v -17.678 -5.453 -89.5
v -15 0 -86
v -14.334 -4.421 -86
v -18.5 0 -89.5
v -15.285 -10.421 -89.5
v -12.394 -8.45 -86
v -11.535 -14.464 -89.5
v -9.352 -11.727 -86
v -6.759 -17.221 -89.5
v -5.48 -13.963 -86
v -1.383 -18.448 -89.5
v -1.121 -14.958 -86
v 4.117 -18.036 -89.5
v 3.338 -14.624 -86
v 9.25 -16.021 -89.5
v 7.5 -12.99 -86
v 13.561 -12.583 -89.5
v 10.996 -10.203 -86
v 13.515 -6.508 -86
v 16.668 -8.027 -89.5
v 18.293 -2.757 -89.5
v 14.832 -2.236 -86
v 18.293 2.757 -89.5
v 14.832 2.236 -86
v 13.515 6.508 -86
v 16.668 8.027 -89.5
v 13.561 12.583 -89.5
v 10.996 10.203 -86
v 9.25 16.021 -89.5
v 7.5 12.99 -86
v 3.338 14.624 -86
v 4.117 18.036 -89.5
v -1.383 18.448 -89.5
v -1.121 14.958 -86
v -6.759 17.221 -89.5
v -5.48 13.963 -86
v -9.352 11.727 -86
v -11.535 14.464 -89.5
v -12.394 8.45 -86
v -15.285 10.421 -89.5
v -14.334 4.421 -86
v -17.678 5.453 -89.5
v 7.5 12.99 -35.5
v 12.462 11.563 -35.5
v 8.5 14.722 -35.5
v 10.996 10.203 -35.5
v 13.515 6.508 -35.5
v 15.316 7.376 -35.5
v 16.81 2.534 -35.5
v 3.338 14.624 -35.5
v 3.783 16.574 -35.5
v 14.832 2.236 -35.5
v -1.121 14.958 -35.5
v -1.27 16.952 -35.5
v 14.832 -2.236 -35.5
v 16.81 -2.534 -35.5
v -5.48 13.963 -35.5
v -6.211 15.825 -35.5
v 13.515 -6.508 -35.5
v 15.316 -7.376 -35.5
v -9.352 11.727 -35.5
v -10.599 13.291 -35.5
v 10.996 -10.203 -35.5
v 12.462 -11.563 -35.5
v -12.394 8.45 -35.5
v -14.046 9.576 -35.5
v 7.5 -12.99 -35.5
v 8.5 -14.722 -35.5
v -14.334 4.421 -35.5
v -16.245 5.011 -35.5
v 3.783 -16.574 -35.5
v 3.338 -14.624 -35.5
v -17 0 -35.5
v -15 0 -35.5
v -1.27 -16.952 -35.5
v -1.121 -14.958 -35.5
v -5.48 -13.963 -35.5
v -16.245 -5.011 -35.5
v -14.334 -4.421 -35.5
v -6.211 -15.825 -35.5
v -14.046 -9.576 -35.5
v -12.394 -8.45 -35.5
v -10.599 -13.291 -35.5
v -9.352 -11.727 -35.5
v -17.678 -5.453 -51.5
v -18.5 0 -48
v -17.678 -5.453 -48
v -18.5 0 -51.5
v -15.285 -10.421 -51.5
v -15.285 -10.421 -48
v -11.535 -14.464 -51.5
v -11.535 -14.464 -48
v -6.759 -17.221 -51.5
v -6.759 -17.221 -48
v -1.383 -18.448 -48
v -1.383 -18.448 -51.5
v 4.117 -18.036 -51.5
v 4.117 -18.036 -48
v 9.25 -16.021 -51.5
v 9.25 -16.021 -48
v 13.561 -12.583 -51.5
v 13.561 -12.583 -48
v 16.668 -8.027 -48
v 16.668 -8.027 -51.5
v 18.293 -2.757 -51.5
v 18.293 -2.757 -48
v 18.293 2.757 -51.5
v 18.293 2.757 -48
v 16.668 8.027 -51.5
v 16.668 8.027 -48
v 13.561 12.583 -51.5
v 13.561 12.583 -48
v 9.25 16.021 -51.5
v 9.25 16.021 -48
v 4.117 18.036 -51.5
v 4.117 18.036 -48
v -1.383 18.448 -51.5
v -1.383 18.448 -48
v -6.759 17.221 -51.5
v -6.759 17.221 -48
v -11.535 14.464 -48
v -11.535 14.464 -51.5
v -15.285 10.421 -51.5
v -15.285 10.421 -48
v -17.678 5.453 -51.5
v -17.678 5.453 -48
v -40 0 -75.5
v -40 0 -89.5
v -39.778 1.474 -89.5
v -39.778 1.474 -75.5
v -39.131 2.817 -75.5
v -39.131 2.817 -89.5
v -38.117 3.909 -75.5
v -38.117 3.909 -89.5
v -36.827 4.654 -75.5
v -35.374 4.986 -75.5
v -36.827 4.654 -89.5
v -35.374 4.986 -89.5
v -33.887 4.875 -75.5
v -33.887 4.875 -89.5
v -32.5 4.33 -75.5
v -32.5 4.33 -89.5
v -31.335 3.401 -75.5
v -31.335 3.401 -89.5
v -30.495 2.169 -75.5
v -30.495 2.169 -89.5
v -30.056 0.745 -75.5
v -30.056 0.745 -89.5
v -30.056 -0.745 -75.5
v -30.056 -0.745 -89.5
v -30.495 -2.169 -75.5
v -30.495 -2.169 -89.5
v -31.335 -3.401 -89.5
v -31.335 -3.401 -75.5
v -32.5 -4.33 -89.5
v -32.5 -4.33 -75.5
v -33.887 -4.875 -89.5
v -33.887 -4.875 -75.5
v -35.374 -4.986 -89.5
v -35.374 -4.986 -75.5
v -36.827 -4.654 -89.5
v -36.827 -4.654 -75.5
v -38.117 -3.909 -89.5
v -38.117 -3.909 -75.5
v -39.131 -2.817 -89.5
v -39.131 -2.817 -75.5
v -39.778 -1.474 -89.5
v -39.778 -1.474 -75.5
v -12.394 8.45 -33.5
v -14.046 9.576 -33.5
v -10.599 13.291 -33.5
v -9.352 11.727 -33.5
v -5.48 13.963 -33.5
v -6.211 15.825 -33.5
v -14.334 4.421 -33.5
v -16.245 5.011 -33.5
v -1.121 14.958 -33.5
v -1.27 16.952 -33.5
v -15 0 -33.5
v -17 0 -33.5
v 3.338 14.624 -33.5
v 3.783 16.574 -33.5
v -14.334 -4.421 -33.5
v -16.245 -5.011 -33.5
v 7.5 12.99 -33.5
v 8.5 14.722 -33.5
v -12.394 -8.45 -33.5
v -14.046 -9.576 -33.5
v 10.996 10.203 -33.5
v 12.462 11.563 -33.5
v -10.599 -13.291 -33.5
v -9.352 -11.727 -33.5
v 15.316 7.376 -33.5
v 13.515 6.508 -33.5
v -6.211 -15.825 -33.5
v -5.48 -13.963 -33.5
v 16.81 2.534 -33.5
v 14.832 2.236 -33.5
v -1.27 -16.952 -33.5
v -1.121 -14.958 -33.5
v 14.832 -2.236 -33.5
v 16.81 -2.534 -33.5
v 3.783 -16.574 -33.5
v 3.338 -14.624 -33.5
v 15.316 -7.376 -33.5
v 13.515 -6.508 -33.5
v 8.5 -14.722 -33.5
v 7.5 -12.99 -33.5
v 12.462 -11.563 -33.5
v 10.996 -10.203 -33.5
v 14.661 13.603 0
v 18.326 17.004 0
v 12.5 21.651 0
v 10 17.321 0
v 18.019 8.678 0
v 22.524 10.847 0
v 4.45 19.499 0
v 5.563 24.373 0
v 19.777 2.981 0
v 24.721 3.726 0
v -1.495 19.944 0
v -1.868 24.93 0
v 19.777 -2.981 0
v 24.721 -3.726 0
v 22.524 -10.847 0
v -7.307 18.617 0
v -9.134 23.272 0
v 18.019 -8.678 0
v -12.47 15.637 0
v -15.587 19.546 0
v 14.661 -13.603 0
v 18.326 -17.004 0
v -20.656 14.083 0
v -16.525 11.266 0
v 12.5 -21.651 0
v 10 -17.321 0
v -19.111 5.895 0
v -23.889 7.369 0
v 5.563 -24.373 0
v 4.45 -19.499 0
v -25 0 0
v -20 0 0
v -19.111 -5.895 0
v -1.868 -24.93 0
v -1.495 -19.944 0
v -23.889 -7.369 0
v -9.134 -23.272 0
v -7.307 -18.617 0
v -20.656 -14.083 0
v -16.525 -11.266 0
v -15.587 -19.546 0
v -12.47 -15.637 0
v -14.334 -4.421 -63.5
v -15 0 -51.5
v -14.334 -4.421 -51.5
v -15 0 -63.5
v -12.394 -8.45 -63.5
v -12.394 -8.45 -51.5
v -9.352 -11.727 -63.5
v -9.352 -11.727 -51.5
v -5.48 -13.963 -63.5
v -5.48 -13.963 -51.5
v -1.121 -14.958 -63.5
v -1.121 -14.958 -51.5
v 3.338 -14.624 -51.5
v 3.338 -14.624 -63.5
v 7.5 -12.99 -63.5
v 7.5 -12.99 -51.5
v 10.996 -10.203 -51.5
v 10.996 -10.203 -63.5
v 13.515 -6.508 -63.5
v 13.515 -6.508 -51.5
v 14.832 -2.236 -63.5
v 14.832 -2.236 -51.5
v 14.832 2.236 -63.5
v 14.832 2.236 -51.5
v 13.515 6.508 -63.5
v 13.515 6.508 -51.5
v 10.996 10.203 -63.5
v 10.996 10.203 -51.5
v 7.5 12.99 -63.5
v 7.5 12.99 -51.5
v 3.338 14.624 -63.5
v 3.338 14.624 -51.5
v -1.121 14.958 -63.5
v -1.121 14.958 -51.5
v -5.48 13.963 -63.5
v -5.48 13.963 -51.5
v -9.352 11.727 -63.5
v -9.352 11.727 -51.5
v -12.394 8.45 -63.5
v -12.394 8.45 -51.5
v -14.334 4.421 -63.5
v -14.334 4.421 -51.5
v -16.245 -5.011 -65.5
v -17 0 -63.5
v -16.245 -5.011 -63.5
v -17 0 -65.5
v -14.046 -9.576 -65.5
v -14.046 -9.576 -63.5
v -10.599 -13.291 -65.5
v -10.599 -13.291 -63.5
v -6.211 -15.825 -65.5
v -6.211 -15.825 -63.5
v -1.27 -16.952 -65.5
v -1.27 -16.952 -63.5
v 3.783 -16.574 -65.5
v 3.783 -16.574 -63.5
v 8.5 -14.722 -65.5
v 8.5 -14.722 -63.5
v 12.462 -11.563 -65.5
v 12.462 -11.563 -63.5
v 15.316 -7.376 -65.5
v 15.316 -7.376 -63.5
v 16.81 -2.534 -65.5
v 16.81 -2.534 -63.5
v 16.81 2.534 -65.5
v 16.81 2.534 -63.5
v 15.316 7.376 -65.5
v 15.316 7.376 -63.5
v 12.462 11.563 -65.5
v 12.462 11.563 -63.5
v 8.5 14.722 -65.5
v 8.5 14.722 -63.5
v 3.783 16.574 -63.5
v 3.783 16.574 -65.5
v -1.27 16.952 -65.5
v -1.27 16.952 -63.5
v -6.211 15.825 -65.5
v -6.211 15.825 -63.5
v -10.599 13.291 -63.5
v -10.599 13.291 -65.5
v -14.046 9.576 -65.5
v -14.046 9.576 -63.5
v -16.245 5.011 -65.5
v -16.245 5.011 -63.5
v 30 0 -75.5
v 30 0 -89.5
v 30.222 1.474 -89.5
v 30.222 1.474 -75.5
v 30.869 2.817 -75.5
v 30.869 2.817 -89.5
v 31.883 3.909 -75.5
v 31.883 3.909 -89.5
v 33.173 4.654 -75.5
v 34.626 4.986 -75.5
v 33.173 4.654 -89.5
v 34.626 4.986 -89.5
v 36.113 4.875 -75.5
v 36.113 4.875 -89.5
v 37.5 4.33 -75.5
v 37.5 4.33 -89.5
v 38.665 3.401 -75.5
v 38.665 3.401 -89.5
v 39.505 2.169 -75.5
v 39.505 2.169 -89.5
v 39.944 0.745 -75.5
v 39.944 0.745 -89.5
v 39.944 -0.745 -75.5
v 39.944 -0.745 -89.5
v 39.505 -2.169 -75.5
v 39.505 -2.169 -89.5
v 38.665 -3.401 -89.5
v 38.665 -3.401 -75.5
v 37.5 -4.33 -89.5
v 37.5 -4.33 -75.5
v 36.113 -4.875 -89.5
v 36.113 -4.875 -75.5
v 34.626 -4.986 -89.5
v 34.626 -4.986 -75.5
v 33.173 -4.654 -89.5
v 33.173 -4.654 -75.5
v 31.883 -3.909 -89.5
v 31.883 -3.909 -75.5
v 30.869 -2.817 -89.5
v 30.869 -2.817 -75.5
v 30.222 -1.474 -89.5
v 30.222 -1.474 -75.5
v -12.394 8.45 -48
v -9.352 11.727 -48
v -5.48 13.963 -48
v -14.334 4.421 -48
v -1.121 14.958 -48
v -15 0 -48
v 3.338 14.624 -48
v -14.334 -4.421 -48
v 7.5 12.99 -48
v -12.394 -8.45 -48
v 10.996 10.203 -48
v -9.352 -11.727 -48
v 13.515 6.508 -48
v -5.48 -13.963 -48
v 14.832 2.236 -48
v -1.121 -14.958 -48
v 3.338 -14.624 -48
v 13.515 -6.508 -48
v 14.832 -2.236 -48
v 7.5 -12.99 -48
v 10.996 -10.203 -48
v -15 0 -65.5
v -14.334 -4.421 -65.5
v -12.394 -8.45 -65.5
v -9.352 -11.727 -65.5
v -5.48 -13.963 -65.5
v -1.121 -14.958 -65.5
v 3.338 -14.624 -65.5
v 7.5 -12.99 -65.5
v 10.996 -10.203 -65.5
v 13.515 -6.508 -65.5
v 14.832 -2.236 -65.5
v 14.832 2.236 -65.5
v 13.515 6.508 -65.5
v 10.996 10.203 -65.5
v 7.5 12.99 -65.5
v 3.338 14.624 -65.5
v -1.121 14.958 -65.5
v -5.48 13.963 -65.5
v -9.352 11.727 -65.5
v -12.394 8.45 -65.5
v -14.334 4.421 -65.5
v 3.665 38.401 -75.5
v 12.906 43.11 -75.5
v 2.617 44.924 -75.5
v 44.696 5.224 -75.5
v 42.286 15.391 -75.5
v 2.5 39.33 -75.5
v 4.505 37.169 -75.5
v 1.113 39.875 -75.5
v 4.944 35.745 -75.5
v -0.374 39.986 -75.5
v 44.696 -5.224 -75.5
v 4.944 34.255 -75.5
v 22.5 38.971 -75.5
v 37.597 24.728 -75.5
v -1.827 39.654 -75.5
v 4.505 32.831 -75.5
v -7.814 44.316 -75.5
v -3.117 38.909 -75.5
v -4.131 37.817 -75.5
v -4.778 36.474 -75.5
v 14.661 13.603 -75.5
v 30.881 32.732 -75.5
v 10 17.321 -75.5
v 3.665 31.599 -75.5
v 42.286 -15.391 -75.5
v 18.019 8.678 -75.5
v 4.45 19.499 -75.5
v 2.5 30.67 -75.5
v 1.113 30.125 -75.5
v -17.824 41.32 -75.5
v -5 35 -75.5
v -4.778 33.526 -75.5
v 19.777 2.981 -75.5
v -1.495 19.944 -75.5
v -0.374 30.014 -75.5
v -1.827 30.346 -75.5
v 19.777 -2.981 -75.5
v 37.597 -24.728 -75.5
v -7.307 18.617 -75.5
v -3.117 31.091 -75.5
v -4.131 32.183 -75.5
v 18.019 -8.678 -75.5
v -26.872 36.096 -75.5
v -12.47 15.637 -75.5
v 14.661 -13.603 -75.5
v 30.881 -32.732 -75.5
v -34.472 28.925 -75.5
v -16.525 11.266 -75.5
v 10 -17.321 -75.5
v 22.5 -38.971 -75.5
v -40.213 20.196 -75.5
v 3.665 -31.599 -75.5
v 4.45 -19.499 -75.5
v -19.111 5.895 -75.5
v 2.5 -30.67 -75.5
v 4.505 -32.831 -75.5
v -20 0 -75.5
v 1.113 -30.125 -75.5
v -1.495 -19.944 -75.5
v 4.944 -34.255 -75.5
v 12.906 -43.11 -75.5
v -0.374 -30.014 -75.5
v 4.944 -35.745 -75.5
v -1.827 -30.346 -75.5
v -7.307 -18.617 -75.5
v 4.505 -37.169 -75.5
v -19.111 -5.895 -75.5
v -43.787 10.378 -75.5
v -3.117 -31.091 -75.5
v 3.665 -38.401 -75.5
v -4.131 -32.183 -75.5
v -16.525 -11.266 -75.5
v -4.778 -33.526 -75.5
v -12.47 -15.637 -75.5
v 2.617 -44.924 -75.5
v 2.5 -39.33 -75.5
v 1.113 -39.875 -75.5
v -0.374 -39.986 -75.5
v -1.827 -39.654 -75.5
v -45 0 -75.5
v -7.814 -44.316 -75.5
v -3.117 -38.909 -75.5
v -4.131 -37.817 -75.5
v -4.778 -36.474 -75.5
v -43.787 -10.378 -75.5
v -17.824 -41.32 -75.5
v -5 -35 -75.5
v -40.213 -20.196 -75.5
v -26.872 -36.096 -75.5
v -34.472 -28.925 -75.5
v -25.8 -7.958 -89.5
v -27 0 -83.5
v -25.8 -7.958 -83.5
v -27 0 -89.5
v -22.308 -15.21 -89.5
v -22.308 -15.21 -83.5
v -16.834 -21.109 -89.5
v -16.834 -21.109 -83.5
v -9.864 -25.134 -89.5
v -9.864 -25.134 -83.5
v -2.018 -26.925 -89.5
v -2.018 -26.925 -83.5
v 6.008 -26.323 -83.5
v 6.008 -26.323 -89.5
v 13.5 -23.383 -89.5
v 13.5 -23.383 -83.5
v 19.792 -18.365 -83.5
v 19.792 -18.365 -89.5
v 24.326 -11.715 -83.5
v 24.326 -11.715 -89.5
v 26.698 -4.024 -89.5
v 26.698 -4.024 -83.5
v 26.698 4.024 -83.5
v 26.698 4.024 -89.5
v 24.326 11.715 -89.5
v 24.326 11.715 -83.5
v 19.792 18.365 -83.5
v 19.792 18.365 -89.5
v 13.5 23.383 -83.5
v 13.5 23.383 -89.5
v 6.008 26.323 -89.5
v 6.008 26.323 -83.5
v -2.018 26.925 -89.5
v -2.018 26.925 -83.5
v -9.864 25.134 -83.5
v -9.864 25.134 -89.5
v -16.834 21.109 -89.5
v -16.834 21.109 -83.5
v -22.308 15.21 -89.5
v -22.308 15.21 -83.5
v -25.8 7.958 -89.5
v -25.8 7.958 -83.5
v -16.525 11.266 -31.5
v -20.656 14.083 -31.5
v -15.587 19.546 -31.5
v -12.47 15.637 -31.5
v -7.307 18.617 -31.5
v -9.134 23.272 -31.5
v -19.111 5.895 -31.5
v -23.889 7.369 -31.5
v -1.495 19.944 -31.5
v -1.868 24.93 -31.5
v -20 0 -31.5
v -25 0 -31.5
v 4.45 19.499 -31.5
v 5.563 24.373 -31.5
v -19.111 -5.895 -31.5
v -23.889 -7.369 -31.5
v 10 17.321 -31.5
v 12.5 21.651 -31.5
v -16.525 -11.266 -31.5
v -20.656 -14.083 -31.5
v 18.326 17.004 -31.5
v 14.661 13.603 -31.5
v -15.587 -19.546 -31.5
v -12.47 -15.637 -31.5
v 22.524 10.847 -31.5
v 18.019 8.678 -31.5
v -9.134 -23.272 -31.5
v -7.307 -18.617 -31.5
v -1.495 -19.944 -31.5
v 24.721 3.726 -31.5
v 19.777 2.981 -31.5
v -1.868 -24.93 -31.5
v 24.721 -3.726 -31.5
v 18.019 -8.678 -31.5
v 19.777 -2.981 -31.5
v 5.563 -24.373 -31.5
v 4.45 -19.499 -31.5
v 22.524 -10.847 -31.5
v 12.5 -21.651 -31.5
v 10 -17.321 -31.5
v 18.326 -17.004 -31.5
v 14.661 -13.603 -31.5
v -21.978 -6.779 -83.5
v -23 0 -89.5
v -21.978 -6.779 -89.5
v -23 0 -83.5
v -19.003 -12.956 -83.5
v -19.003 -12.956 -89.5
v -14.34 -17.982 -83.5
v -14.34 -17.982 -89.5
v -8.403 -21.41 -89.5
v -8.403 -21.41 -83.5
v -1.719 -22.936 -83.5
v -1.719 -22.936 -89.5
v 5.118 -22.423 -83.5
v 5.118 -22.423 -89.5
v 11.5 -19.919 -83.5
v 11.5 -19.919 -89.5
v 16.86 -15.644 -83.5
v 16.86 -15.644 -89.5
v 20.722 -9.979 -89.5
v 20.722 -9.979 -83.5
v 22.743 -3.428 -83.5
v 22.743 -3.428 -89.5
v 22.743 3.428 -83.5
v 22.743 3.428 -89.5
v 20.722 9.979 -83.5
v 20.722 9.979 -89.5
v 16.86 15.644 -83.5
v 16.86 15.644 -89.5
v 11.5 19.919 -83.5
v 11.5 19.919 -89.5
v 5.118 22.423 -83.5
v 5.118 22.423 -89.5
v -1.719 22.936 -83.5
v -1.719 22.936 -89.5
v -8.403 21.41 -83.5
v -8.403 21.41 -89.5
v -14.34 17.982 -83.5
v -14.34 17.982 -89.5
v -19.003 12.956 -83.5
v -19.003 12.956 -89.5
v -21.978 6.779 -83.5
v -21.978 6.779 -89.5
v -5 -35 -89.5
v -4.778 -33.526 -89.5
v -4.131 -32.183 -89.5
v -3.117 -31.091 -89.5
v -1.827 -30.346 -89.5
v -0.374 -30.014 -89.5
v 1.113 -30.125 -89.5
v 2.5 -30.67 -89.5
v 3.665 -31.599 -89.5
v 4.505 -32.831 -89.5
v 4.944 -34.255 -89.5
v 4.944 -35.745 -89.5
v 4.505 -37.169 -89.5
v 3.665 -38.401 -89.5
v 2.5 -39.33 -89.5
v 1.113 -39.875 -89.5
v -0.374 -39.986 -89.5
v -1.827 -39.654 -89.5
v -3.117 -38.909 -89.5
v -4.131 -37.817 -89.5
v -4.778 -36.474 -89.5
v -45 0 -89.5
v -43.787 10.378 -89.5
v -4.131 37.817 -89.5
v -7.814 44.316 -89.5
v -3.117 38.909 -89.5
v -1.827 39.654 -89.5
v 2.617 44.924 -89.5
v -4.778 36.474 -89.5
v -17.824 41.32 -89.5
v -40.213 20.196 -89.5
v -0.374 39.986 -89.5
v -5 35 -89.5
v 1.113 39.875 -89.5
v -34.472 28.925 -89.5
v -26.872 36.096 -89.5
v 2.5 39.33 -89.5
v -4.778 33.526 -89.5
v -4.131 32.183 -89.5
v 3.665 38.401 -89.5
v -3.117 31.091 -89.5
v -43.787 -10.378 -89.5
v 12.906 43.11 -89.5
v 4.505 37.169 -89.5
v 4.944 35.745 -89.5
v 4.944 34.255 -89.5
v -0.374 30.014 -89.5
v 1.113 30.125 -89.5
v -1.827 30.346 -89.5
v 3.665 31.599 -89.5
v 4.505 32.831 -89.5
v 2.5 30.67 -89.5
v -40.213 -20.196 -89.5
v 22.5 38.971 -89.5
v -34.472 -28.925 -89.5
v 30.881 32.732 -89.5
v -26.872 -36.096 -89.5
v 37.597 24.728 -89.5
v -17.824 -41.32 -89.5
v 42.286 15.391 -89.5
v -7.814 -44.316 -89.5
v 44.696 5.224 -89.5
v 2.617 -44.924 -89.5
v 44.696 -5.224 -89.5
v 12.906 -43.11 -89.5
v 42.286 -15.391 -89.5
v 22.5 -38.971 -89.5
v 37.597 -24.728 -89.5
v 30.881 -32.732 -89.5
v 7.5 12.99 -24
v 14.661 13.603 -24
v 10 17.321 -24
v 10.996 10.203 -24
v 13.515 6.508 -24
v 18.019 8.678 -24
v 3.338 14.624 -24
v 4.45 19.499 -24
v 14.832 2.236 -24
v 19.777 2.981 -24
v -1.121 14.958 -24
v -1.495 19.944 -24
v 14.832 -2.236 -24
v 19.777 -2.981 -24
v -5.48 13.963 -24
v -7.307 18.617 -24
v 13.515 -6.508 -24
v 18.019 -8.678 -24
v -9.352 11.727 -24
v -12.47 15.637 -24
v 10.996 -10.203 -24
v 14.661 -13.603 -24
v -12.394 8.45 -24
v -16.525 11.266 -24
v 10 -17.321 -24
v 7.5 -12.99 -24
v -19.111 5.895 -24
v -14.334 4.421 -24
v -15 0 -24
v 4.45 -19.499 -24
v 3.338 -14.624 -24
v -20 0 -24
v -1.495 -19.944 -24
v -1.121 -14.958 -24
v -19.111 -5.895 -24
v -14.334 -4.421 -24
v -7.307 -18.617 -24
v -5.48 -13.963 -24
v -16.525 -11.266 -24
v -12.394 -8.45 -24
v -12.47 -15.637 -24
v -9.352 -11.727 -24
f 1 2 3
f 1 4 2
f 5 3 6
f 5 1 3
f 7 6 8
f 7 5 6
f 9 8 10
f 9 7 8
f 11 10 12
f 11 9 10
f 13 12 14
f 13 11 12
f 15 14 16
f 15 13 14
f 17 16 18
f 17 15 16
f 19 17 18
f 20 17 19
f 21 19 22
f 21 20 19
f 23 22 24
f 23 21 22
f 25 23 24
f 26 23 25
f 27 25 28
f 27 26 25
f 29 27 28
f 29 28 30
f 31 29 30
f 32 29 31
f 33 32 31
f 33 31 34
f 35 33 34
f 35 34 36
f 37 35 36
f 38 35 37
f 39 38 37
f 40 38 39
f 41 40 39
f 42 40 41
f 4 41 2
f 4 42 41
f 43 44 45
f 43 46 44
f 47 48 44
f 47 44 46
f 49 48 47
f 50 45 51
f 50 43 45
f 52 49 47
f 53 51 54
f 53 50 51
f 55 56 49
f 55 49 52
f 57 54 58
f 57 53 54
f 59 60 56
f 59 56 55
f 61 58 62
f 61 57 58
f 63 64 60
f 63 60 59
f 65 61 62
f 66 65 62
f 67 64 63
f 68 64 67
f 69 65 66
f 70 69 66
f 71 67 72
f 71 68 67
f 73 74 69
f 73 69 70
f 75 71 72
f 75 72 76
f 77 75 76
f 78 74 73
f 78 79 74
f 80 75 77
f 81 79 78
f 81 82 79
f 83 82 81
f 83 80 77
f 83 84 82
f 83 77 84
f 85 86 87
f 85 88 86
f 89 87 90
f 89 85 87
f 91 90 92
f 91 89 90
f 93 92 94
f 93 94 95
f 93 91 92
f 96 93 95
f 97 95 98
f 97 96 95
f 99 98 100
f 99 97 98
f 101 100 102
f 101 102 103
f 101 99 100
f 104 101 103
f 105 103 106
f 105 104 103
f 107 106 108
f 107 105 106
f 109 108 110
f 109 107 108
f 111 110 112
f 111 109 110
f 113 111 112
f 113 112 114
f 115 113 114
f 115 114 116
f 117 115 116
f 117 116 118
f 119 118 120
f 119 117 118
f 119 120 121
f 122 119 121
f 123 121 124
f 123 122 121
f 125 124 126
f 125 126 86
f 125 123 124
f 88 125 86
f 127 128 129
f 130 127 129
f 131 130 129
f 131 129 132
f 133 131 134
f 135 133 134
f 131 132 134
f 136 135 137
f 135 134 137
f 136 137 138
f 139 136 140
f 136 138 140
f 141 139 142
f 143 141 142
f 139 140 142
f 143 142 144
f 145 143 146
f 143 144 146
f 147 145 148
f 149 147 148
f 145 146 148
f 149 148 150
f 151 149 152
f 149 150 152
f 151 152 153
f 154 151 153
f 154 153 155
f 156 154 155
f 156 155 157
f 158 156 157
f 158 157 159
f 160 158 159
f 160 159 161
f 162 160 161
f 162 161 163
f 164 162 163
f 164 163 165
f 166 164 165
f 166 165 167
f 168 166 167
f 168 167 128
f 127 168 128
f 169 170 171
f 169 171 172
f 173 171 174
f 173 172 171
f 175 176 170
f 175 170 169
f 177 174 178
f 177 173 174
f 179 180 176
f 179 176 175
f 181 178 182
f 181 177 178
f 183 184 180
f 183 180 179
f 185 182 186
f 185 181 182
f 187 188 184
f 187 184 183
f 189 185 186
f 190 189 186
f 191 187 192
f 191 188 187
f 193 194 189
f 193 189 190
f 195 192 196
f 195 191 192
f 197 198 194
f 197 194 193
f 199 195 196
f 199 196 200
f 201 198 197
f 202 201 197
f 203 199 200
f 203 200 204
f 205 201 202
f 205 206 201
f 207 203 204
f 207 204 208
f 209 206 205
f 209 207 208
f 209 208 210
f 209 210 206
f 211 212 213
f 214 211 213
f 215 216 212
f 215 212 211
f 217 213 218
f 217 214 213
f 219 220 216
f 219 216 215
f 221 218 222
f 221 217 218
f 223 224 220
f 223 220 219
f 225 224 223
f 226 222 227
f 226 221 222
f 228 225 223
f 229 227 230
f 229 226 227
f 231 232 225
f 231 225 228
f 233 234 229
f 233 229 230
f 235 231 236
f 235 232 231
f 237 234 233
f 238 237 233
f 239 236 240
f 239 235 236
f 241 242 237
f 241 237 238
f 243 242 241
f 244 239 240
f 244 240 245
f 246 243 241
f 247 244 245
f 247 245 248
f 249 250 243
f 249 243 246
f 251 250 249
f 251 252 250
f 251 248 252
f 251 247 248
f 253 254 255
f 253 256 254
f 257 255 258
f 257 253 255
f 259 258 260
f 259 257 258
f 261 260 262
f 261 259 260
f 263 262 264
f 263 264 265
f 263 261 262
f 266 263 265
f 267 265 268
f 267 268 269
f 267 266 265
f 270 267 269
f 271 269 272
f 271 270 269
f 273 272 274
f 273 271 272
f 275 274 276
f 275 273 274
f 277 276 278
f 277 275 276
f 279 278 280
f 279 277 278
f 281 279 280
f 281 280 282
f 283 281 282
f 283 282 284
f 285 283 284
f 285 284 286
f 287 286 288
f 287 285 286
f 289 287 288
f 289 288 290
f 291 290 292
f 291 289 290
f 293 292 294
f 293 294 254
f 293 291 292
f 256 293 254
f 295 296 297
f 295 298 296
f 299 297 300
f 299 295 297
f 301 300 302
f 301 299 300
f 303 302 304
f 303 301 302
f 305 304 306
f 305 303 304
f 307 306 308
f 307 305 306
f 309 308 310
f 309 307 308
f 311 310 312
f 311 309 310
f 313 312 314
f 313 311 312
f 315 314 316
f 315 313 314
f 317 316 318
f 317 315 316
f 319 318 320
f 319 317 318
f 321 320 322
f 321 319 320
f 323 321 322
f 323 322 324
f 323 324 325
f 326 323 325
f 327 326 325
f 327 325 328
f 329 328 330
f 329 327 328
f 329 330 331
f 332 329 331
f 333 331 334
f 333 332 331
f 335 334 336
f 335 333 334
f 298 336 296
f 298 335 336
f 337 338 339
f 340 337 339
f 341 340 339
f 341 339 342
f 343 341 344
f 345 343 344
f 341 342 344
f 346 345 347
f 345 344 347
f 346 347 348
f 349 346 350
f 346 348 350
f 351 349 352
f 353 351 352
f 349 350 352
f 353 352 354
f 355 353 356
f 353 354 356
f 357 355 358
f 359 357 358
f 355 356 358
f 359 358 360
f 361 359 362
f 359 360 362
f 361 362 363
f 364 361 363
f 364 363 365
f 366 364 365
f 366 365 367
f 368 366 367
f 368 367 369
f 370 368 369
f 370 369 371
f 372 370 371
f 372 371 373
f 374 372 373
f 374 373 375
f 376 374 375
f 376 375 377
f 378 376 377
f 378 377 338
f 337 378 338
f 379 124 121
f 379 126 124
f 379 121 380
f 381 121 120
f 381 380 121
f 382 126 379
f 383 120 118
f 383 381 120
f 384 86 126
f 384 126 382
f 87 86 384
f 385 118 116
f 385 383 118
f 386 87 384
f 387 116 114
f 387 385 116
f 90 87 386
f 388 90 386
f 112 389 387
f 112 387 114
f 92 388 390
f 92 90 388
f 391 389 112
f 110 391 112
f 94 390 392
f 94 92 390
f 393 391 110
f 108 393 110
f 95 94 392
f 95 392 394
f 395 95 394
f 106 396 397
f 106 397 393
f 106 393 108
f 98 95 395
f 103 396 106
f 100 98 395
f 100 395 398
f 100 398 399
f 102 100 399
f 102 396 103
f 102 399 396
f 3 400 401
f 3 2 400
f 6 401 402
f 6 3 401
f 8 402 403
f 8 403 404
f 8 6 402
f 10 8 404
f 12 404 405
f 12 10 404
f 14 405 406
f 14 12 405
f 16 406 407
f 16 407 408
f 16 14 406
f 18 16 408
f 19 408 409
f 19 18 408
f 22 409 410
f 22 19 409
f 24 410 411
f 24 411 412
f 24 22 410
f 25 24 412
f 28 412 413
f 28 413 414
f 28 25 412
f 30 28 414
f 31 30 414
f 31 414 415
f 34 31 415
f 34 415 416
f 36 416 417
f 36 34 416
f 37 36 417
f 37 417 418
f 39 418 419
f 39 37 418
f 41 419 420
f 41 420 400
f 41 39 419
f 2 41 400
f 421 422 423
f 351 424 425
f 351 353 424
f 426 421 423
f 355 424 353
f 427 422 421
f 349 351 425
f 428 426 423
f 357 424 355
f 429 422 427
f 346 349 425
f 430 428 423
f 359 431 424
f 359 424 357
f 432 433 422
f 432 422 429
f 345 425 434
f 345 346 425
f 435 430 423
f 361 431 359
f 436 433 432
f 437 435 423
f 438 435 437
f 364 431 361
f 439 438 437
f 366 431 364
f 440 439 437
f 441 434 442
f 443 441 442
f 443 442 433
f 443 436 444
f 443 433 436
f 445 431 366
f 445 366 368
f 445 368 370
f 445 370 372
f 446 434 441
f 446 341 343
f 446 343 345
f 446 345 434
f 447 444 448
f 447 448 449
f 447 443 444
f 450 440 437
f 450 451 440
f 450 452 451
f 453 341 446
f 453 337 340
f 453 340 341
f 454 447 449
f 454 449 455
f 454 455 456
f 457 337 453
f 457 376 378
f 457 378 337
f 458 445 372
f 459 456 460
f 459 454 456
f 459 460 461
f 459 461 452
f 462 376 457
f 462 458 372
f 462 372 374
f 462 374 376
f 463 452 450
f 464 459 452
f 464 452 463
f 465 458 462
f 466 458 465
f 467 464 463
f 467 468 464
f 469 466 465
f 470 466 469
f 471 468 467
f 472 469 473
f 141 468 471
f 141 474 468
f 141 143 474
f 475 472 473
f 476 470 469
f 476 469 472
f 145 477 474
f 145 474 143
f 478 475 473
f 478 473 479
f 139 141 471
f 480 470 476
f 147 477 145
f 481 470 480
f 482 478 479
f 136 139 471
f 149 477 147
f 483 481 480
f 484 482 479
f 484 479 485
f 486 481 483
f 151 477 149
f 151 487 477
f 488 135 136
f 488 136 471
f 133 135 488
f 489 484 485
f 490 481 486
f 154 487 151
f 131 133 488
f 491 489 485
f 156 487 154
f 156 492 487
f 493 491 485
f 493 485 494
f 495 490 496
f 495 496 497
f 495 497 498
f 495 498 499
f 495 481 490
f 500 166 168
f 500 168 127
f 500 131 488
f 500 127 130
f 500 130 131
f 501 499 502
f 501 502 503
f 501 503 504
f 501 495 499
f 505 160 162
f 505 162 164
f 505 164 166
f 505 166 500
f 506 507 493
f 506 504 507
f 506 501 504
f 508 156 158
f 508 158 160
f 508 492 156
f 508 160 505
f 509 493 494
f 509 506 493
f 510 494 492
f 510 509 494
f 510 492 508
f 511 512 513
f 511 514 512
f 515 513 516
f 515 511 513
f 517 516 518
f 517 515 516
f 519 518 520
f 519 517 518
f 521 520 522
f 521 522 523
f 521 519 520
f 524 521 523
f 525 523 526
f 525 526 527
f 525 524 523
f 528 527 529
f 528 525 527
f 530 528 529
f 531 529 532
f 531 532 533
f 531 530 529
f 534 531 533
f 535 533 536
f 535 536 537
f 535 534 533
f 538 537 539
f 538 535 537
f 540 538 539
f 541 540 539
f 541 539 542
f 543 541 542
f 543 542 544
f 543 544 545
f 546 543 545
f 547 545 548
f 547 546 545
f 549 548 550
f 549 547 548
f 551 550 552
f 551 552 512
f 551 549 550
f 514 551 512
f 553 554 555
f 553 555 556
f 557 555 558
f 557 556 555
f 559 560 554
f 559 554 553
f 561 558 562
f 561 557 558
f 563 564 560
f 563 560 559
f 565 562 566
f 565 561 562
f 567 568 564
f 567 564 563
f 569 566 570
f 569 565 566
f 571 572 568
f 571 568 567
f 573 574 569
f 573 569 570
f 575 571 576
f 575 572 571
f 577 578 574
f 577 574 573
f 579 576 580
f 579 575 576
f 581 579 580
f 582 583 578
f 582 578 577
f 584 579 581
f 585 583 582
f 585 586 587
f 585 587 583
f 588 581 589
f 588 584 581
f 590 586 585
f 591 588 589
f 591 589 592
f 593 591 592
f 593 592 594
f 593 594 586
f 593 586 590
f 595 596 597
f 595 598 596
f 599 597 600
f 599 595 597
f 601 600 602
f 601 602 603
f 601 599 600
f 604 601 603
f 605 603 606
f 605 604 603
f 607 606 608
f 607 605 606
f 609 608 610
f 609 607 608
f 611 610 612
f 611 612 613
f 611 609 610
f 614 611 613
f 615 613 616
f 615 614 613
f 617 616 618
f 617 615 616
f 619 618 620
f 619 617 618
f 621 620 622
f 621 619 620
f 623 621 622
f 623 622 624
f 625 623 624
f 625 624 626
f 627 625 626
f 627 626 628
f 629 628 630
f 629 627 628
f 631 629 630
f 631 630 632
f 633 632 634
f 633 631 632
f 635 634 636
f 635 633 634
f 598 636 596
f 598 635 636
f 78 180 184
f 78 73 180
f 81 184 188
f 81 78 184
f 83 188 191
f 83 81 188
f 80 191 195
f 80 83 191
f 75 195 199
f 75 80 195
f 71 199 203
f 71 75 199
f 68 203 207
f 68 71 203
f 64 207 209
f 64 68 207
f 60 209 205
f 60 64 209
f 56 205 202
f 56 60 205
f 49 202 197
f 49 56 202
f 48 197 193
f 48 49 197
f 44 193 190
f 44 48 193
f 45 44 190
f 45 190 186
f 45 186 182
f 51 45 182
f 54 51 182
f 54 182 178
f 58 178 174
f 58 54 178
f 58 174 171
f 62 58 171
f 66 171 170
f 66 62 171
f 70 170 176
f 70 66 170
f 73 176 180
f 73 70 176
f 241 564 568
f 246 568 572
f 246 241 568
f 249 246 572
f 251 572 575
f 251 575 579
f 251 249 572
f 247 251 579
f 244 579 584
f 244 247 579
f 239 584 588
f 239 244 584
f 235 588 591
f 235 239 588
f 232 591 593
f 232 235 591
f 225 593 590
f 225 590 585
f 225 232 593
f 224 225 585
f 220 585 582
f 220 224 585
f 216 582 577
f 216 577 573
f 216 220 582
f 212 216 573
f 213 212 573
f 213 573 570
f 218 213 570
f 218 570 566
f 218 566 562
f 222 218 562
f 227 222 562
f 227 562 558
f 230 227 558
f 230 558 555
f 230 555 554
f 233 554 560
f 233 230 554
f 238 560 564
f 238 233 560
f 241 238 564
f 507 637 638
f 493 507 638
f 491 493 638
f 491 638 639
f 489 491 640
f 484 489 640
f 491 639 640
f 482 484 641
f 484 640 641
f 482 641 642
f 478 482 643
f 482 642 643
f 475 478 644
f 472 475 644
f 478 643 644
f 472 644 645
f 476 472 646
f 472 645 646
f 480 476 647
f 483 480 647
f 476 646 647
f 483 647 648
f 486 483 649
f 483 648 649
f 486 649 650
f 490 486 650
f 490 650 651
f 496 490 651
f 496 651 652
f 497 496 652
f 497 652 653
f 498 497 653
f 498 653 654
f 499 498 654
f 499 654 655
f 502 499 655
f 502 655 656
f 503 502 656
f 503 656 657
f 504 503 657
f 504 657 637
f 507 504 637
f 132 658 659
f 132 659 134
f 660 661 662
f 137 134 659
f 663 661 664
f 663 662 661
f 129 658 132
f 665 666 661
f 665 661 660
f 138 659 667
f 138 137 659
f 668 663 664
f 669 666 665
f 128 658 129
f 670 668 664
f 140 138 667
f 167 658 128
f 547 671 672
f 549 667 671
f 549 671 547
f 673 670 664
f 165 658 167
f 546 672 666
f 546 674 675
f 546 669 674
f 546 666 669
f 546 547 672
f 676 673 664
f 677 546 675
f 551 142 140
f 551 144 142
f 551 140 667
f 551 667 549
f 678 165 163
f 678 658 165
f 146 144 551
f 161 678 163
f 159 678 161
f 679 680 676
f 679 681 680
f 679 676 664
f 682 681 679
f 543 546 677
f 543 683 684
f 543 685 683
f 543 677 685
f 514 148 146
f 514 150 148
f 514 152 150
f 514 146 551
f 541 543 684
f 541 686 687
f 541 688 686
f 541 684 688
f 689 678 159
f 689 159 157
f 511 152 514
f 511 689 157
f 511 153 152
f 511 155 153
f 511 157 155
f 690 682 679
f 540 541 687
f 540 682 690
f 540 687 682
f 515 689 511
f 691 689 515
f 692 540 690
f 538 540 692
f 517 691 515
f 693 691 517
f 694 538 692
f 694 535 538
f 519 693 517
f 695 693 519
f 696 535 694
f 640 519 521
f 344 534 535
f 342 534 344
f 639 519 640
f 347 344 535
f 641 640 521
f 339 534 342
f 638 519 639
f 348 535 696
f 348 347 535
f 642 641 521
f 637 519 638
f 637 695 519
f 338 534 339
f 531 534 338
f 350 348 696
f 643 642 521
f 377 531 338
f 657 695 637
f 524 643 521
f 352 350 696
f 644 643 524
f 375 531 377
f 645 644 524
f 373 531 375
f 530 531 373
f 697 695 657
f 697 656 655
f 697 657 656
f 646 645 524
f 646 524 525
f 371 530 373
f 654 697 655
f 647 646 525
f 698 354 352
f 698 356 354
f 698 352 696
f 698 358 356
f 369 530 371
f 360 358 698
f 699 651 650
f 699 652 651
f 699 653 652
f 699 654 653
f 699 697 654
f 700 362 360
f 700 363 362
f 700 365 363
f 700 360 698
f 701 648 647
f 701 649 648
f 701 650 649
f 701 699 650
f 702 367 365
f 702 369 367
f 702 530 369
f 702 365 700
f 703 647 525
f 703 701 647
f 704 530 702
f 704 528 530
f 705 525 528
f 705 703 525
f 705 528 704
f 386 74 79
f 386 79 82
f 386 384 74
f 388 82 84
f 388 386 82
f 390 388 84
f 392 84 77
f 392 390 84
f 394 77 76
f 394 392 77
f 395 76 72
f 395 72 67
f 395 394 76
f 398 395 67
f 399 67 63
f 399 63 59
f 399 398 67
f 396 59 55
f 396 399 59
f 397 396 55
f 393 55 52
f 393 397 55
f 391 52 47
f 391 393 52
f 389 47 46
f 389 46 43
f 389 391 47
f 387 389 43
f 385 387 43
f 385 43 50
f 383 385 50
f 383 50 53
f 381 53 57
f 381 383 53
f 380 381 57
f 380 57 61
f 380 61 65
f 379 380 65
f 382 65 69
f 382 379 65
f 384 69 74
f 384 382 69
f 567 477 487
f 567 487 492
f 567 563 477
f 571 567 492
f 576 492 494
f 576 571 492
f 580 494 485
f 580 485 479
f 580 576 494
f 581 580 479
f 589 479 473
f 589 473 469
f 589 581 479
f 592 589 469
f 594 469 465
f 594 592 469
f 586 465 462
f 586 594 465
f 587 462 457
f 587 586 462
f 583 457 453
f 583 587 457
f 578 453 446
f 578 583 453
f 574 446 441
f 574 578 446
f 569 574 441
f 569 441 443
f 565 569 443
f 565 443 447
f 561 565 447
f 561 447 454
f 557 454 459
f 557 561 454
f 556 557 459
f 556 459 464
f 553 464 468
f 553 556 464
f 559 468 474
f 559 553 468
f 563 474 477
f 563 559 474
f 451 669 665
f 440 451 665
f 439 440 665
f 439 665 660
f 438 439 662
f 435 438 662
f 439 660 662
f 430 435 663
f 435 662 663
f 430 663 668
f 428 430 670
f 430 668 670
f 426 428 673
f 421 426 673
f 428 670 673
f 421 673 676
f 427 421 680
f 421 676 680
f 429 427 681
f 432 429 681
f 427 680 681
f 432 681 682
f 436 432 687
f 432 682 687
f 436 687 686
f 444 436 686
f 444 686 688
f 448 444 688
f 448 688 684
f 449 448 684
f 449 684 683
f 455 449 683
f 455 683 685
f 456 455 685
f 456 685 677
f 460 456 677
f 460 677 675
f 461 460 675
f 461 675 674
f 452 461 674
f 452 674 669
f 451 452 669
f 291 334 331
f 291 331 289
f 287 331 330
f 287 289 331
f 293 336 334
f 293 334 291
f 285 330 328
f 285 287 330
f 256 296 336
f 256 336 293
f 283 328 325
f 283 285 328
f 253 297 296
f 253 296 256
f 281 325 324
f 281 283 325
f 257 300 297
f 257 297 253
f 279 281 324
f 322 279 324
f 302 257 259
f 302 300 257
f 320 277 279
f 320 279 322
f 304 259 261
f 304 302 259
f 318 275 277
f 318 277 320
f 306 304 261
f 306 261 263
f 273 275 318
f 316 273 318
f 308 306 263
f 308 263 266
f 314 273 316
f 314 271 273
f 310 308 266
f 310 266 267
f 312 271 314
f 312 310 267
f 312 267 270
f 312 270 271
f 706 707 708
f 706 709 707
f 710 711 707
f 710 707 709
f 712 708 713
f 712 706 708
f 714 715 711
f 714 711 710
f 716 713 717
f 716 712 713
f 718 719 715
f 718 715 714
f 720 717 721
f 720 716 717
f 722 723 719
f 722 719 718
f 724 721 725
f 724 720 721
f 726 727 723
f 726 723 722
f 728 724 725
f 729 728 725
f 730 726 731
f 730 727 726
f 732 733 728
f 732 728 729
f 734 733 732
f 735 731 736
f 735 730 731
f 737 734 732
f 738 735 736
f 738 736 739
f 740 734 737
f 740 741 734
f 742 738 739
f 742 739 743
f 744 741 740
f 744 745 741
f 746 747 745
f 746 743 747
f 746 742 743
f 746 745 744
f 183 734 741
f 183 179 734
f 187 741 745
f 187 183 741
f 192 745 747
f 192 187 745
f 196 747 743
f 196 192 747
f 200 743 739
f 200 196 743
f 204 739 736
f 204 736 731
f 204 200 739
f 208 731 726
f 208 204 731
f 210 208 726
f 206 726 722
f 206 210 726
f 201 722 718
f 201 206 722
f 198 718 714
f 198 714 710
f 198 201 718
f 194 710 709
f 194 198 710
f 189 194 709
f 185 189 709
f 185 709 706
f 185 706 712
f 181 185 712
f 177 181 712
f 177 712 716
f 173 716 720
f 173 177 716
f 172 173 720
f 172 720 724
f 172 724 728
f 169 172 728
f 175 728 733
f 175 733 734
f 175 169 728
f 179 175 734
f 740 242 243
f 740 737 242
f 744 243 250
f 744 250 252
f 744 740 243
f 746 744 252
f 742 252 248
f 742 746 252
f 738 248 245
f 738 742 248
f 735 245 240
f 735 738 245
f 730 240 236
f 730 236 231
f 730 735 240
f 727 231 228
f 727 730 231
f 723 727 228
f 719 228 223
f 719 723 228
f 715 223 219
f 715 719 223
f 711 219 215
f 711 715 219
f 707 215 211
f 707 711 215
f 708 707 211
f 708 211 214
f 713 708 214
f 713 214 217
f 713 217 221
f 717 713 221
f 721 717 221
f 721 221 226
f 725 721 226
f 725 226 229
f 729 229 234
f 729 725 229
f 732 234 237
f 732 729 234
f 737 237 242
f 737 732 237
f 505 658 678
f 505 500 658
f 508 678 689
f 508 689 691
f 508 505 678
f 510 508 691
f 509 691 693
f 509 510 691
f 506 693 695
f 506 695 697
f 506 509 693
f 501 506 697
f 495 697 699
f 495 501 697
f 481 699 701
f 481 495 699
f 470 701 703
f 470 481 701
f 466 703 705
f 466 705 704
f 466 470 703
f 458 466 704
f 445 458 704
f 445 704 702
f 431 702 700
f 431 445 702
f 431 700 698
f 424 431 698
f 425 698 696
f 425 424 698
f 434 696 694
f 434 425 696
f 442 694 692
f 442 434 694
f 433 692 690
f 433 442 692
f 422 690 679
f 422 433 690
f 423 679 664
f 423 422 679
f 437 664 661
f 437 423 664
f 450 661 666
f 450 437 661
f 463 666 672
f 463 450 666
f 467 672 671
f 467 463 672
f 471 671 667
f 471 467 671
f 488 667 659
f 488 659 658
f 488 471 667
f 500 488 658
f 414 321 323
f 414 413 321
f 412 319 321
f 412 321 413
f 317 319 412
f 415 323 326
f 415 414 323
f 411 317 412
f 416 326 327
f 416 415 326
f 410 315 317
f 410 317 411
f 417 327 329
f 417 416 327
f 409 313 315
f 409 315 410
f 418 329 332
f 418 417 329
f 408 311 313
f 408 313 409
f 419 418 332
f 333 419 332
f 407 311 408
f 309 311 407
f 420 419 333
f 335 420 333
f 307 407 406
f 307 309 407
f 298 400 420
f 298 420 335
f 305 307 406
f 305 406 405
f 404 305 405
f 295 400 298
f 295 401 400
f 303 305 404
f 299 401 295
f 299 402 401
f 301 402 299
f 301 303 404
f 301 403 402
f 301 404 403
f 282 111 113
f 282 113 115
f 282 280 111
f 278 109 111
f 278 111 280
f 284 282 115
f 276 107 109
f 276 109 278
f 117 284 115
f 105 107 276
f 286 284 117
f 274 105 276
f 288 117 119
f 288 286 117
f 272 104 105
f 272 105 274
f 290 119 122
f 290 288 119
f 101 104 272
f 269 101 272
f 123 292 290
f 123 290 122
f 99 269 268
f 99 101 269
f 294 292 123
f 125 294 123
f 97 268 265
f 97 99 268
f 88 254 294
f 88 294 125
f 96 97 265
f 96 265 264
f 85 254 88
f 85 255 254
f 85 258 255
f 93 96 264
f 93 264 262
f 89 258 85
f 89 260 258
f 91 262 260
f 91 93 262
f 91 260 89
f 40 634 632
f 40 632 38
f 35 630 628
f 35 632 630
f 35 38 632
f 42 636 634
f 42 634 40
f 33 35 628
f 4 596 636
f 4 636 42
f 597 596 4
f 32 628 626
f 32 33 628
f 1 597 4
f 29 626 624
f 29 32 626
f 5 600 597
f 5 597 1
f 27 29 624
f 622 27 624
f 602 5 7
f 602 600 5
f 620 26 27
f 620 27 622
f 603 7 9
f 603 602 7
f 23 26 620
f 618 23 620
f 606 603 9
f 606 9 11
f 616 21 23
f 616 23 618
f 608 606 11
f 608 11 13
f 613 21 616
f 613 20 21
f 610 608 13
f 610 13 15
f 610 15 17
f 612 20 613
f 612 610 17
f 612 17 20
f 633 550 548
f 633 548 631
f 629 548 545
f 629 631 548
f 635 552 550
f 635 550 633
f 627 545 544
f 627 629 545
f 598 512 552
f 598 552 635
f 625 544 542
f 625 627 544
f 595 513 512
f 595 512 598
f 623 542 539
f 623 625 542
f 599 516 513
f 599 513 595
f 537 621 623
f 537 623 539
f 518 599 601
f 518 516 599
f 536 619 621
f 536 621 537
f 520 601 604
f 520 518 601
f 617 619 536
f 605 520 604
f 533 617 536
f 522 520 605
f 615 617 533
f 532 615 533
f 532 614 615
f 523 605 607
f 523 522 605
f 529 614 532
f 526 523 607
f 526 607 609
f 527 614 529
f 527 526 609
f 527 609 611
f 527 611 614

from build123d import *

# Parameters (mm, degrees)
SKETCH2_R          = 5
CUT_EXTRUDE1_DEPTH = 110.819169547


with BuildPart() as part:
    # Sketch1 → Revolve1 (revolve)
    with BuildSketch(Plane(origin=(0, 0, 0), x_dir=(0, 0, -1), z_dir=(1, 0, 0)), mode=Mode.PRIVATE) as revolve1_sk:
        Polygon((0, 25), (0, 20), (24, 20), (24, 15), (33.5, 15), (33.5, 17), (35.5, 17), (35.5, 15), (48, 15), (48, 18.5), (51.5, 18.5), (51.5, 15), (63.5, 15), (63.5, 17), (65.5, 17), (65.5, 15), (86, 15), (89.5, 18.5), (89.5, 23), (83.5, 23), (83.5, 27), (89.5, 27), (89.5, 45), (75.5, 45), (75.5, 20), (31.5, 20), (31.5, 25), align=None)
    revolve(revolve1_sk.sketch.rotate(Axis((0, 0, -114.136596419), (0, 0, 1)), 90), axis=Axis((0, 0, -114.136596419), (0, 0, 1)))

    # Sketch2 → Cut-Extrude1 (cut, through all)
    with BuildSketch(Plane(origin=(0, 0, -89.5), x_dir=(-1, 0, 0), z_dir=(0, 0, -1))):
        with Locations((0, 35)):
            Circle(SKETCH2_R)
        with Locations((35, 0)):
            Circle(SKETCH2_R)
        with Locations((0, -35)):
            Circle(SKETCH2_R)
        with Locations((-35, 0)):
            Circle(SKETCH2_R)
    extrude(amount=-CUT_EXTRUDE1_DEPTH, mode=Mode.SUBTRACT)


solid = part.part
